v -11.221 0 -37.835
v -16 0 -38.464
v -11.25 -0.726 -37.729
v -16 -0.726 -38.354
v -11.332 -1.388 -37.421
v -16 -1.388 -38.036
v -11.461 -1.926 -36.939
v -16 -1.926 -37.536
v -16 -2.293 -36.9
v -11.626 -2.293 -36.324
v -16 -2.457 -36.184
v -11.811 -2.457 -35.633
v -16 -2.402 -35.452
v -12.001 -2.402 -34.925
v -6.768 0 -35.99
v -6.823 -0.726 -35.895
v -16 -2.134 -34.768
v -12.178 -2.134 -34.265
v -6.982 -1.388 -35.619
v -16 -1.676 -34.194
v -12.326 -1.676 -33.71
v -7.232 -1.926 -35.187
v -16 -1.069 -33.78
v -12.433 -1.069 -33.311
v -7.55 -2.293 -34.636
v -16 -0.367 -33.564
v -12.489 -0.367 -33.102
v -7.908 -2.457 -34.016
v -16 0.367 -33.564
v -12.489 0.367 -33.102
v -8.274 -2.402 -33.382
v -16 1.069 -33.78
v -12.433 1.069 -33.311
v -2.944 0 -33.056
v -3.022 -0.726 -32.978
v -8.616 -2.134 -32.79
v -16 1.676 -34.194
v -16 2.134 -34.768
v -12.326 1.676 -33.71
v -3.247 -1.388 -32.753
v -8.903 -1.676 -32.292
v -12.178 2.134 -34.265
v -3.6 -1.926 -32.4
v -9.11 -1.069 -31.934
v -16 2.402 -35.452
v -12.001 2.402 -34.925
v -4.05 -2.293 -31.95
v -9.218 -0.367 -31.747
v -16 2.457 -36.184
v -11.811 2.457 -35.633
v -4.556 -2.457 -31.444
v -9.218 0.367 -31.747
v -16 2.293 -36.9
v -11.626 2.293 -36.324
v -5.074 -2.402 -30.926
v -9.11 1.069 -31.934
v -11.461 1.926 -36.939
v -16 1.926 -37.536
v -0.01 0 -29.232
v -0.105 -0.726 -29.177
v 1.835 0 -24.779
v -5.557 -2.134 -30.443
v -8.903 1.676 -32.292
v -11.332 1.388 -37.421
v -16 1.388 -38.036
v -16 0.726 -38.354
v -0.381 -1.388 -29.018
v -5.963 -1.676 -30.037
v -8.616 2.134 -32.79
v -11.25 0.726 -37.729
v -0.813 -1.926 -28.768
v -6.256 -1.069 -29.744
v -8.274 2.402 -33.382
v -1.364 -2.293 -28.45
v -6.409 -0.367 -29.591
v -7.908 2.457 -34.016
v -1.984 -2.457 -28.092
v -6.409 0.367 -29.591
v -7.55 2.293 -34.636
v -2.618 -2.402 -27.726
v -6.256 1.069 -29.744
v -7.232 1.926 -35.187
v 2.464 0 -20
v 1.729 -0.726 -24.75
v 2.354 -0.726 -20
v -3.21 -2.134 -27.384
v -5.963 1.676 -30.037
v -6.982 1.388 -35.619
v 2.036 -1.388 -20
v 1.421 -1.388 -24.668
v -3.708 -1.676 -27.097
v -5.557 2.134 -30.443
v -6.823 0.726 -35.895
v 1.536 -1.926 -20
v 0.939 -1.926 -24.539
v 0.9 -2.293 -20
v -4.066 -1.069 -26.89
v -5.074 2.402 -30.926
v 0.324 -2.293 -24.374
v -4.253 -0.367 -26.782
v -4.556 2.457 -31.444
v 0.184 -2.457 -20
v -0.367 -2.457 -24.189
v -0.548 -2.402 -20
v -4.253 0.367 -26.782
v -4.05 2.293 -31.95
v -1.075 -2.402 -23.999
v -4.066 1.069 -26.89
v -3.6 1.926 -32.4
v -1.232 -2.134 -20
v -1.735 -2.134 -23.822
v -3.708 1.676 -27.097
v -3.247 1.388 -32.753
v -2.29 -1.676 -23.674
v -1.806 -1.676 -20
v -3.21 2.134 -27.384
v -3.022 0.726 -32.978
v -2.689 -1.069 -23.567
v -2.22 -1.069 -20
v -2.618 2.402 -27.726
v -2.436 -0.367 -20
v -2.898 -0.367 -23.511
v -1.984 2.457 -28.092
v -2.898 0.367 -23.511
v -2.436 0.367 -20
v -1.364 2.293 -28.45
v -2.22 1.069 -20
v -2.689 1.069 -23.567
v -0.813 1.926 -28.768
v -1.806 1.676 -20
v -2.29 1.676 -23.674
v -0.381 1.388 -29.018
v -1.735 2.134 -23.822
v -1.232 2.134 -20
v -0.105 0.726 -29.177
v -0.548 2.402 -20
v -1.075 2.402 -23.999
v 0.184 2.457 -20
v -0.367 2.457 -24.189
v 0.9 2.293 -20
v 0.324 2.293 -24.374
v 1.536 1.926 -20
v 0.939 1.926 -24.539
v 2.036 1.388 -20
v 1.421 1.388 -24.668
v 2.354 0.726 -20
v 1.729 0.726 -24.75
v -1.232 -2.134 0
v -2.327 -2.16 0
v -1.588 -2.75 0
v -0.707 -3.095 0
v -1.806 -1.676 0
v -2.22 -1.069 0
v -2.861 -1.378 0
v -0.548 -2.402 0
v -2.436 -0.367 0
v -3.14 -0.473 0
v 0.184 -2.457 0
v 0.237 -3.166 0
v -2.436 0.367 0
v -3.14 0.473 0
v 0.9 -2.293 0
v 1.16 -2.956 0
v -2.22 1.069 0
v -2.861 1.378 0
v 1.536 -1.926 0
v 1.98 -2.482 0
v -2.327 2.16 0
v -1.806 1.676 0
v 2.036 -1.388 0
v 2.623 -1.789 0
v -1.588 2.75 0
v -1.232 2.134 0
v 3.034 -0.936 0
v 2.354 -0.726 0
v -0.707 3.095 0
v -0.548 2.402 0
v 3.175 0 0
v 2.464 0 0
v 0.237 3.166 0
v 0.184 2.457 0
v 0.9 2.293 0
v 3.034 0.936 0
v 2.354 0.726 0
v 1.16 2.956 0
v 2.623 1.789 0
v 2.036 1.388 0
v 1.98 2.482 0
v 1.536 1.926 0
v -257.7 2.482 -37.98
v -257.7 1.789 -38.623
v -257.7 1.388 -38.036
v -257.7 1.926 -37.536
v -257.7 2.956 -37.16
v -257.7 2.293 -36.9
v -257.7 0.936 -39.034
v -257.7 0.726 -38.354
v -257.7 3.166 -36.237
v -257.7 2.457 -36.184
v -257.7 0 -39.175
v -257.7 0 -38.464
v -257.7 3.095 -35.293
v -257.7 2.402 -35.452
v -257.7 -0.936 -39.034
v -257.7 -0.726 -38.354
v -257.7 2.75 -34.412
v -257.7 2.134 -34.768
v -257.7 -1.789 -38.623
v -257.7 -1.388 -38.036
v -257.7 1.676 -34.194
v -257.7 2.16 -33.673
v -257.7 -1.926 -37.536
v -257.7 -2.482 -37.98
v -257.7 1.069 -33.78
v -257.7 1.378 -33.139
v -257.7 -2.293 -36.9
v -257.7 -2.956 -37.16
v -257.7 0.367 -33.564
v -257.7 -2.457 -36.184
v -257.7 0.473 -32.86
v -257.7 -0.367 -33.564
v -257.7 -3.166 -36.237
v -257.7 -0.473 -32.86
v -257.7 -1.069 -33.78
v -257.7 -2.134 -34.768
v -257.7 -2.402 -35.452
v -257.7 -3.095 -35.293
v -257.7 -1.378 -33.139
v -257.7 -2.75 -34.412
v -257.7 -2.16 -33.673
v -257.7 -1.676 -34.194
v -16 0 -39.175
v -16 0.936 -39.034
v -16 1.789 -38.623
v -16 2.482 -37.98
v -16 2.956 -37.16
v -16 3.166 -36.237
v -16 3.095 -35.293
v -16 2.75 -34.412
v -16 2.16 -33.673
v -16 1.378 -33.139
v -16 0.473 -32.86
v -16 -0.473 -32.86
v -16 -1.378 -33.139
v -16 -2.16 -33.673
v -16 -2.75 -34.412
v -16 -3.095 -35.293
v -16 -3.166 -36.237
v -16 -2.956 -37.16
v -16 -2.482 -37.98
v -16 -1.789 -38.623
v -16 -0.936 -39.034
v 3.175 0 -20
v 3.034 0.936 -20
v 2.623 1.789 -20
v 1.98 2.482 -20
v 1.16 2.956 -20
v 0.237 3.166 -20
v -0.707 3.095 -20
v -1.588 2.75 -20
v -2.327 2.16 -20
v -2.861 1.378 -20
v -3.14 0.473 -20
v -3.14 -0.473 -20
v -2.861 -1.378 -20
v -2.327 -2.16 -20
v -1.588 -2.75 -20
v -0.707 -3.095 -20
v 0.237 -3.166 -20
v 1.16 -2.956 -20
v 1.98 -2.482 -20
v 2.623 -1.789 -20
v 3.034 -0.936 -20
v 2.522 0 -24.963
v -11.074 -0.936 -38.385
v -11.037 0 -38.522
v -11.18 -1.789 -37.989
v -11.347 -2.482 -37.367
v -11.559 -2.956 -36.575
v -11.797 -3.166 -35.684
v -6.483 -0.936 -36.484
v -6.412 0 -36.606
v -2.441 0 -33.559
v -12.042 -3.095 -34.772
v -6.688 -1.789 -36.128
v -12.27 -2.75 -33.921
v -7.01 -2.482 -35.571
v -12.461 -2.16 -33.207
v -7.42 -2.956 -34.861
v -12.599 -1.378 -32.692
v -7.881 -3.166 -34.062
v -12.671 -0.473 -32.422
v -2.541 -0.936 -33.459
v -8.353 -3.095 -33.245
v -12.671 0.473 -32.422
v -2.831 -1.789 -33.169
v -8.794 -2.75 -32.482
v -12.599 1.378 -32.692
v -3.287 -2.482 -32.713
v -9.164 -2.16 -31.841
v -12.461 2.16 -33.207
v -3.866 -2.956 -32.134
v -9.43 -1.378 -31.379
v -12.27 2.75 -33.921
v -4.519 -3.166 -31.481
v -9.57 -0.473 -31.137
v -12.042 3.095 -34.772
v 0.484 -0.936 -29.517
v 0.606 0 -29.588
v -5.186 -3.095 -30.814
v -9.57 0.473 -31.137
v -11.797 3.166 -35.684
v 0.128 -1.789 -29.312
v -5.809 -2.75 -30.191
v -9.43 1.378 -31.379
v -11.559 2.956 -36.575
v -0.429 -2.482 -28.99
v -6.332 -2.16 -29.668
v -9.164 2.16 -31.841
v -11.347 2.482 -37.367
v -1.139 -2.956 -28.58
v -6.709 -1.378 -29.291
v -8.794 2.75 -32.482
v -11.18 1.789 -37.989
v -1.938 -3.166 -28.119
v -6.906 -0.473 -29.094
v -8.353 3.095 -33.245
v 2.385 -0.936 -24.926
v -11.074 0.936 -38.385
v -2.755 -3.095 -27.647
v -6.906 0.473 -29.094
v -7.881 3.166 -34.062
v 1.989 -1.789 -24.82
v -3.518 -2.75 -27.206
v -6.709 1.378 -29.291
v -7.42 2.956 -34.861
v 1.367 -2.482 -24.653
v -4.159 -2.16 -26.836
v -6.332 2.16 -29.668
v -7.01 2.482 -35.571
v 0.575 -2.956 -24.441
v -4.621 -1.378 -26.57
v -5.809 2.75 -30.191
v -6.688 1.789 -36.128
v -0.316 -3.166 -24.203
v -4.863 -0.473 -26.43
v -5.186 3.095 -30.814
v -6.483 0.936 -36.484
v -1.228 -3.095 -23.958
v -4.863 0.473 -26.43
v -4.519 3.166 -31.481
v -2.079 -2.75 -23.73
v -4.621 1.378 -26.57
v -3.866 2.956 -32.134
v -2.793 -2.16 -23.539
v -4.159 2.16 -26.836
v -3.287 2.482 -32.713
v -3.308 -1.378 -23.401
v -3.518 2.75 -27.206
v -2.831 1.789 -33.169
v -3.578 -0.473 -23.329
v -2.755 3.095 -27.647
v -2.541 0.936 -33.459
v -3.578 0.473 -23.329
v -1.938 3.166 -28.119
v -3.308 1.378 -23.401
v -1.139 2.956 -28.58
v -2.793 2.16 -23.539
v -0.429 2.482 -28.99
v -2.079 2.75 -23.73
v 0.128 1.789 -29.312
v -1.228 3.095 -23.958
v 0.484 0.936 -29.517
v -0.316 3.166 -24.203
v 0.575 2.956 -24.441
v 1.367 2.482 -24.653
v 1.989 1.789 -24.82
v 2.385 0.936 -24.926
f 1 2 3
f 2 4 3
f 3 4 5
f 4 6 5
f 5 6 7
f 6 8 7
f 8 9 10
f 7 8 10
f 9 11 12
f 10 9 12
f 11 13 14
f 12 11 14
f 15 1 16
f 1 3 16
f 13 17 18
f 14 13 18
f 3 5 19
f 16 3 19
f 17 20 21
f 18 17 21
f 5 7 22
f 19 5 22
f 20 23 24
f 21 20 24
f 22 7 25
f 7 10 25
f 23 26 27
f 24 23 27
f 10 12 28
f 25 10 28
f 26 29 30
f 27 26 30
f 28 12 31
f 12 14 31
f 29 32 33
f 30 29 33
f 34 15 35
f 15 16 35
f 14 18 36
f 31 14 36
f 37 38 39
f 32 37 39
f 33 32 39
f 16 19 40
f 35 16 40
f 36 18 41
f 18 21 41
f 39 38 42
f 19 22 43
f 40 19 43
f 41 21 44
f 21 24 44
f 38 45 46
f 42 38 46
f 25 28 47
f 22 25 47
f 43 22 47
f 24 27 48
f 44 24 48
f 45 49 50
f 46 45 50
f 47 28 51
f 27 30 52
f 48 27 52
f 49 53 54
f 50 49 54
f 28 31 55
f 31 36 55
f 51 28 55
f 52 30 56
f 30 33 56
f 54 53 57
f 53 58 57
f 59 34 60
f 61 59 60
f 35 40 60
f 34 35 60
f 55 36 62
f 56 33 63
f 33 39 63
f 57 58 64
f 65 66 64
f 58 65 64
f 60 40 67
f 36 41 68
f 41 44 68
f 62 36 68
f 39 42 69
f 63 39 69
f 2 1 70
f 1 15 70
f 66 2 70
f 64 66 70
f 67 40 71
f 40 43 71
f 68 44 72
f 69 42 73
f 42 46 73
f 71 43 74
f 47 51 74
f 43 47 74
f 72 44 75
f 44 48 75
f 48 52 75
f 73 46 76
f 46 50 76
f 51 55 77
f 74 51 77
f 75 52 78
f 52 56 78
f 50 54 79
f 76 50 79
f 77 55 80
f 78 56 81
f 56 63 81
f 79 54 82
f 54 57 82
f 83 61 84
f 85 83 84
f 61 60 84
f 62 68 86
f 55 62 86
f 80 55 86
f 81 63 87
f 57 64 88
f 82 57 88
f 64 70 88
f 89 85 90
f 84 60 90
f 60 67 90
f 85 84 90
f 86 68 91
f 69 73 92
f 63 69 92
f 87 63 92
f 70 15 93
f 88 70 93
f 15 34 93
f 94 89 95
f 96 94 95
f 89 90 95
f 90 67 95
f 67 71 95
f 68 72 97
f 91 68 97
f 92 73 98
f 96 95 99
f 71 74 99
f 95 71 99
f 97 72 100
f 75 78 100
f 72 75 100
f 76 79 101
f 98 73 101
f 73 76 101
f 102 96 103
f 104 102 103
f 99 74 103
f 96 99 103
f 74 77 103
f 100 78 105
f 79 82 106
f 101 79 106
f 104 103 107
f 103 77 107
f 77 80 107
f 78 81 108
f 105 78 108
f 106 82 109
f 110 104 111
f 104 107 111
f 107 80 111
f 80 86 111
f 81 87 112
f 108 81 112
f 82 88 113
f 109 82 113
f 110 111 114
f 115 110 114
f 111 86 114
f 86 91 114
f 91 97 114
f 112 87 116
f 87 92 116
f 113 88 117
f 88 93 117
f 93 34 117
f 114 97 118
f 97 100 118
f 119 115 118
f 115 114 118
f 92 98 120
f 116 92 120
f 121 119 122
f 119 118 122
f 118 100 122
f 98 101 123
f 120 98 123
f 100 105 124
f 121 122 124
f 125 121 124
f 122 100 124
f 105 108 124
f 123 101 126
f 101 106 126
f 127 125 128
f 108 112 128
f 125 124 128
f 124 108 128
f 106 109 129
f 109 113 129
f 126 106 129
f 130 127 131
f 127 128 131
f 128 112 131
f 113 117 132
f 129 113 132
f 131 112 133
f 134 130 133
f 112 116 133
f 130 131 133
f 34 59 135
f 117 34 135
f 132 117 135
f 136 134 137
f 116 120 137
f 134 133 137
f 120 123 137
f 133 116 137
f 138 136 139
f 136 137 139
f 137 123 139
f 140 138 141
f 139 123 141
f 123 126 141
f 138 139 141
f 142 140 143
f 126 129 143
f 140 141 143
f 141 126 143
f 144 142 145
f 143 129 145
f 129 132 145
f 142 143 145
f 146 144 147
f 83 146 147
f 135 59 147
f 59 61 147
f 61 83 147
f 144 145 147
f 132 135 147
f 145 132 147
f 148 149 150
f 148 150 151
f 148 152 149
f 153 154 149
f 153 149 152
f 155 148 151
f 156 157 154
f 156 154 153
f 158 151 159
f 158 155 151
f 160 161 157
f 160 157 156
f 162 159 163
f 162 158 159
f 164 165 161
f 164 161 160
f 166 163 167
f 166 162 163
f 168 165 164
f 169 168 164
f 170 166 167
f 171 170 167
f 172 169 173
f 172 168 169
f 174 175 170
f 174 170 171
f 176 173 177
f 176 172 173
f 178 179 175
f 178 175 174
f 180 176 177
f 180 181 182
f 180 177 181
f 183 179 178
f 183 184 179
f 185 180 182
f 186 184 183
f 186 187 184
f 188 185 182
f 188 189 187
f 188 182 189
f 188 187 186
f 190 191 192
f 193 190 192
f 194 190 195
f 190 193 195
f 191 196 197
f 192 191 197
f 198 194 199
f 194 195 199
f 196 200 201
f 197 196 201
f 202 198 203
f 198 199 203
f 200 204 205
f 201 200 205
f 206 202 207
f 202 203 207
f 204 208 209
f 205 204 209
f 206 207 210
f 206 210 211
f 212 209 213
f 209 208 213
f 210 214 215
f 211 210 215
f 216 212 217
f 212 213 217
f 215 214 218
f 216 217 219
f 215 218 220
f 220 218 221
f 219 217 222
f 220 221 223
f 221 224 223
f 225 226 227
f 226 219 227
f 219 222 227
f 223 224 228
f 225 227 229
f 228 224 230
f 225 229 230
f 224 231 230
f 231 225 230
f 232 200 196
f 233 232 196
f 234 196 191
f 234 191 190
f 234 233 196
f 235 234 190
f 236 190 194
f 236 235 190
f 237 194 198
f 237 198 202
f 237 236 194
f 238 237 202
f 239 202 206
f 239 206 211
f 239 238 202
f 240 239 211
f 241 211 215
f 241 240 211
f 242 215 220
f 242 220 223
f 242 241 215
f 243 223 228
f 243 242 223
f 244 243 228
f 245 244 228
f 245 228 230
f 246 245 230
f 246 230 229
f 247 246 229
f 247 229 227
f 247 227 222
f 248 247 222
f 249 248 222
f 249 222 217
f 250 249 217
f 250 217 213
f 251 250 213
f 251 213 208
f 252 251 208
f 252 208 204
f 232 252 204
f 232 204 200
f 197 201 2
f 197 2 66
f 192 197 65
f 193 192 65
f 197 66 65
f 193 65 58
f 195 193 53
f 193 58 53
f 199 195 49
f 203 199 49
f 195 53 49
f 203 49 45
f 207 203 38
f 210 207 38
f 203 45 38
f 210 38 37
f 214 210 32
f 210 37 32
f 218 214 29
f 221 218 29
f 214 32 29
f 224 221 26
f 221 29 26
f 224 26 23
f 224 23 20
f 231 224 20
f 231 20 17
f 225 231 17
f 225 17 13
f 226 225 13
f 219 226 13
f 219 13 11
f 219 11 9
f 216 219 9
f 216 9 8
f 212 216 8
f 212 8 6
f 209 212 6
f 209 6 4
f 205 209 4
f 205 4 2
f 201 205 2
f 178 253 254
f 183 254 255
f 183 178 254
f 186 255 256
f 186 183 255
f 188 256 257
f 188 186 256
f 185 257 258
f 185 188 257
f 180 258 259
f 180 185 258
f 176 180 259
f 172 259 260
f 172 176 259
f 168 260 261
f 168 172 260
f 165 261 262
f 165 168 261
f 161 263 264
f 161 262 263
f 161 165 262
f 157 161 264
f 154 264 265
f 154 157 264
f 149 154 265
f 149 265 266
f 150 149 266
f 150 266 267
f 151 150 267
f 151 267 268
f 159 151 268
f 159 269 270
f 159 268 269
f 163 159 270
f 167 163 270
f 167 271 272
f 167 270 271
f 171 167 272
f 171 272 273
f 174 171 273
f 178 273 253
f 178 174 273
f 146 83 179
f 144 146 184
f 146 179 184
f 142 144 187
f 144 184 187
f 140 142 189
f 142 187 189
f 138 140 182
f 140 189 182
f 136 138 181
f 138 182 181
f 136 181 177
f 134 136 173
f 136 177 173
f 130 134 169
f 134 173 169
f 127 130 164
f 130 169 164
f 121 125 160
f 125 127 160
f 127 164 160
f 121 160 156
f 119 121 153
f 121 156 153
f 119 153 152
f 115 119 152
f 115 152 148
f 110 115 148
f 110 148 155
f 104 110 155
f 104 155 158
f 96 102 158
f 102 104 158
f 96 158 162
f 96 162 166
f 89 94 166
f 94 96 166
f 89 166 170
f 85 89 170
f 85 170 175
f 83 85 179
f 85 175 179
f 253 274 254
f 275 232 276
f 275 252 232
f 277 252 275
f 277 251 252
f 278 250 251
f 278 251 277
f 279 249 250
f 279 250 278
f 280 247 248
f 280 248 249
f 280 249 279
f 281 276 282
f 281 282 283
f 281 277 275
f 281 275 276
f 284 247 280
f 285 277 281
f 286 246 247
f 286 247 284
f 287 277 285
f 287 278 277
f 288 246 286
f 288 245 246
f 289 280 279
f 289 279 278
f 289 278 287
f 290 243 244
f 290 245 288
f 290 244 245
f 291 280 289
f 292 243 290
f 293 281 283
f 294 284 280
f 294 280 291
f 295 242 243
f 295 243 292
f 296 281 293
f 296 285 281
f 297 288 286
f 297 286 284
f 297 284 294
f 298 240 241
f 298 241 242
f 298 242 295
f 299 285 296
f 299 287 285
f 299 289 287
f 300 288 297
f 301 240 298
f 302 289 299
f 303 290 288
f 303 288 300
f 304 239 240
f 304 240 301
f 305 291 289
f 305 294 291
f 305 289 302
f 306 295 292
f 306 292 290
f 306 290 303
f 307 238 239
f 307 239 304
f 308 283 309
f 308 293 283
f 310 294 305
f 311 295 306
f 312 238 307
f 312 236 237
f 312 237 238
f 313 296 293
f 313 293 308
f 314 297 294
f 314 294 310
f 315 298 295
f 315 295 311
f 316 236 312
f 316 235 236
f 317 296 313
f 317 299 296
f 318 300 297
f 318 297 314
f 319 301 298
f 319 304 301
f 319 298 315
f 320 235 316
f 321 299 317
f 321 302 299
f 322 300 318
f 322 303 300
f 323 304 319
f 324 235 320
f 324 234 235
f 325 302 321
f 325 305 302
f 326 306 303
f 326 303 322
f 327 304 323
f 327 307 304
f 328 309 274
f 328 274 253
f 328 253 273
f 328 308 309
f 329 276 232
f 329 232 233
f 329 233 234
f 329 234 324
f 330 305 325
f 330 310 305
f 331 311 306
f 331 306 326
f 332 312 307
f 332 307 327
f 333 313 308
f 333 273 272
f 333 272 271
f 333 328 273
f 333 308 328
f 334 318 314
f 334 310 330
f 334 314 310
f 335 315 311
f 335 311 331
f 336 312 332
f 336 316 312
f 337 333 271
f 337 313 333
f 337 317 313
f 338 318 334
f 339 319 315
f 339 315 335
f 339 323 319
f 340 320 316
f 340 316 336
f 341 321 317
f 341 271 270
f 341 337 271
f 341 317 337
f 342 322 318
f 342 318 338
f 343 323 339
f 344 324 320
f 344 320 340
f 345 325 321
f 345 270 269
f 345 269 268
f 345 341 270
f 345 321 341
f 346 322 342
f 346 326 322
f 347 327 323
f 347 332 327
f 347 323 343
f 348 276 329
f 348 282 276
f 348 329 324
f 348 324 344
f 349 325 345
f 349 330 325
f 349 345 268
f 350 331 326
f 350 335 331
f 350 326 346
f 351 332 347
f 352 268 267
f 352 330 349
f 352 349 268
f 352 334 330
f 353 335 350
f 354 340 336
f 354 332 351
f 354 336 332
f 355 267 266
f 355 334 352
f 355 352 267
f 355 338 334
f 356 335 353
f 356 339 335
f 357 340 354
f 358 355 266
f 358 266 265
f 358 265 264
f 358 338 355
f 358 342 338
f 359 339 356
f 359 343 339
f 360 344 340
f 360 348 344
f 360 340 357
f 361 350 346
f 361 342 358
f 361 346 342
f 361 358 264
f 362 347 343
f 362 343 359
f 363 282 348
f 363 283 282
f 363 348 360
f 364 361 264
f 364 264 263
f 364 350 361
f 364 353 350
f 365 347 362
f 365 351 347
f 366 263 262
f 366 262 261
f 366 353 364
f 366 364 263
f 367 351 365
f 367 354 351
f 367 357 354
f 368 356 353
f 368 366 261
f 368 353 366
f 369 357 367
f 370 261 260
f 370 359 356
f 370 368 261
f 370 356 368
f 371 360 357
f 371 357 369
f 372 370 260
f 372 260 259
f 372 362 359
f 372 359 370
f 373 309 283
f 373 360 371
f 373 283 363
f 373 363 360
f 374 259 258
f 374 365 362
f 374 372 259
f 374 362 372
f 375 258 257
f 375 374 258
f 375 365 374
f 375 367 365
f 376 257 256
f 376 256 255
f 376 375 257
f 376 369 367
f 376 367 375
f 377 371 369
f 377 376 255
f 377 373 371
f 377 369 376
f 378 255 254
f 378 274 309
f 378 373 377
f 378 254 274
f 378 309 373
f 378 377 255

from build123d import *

# Parameters (mm, degrees)
SKETCH2_R   = 3.175
SKETCH2_R_2 = 2.4638


with BuildPart() as part:
    # Sweep-Thin1: sweep along a path in Sketch1
    with BuildLine(Plane(origin=(0, 0, 0), x_dir=(1, 0, 0), z_dir=(0, 1, 0))) as sweep_thin1_path:
        Line((-257.7, 36), (-16, 36))
        ThreePointArc((-16, 36), (-4.686291501, 31.313708499), (0, 20))
        Line((0, 20), (0, 0))
    # Sketch2 → Sweep-Thin1 (sweep)
    with BuildSketch(Plane.XY):
        Circle(SKETCH2_R)
        Circle(SKETCH2_R_2, mode=Mode.SUBTRACT)
    sweep(path=sweep_thin1_path.line)


solid = part.part
